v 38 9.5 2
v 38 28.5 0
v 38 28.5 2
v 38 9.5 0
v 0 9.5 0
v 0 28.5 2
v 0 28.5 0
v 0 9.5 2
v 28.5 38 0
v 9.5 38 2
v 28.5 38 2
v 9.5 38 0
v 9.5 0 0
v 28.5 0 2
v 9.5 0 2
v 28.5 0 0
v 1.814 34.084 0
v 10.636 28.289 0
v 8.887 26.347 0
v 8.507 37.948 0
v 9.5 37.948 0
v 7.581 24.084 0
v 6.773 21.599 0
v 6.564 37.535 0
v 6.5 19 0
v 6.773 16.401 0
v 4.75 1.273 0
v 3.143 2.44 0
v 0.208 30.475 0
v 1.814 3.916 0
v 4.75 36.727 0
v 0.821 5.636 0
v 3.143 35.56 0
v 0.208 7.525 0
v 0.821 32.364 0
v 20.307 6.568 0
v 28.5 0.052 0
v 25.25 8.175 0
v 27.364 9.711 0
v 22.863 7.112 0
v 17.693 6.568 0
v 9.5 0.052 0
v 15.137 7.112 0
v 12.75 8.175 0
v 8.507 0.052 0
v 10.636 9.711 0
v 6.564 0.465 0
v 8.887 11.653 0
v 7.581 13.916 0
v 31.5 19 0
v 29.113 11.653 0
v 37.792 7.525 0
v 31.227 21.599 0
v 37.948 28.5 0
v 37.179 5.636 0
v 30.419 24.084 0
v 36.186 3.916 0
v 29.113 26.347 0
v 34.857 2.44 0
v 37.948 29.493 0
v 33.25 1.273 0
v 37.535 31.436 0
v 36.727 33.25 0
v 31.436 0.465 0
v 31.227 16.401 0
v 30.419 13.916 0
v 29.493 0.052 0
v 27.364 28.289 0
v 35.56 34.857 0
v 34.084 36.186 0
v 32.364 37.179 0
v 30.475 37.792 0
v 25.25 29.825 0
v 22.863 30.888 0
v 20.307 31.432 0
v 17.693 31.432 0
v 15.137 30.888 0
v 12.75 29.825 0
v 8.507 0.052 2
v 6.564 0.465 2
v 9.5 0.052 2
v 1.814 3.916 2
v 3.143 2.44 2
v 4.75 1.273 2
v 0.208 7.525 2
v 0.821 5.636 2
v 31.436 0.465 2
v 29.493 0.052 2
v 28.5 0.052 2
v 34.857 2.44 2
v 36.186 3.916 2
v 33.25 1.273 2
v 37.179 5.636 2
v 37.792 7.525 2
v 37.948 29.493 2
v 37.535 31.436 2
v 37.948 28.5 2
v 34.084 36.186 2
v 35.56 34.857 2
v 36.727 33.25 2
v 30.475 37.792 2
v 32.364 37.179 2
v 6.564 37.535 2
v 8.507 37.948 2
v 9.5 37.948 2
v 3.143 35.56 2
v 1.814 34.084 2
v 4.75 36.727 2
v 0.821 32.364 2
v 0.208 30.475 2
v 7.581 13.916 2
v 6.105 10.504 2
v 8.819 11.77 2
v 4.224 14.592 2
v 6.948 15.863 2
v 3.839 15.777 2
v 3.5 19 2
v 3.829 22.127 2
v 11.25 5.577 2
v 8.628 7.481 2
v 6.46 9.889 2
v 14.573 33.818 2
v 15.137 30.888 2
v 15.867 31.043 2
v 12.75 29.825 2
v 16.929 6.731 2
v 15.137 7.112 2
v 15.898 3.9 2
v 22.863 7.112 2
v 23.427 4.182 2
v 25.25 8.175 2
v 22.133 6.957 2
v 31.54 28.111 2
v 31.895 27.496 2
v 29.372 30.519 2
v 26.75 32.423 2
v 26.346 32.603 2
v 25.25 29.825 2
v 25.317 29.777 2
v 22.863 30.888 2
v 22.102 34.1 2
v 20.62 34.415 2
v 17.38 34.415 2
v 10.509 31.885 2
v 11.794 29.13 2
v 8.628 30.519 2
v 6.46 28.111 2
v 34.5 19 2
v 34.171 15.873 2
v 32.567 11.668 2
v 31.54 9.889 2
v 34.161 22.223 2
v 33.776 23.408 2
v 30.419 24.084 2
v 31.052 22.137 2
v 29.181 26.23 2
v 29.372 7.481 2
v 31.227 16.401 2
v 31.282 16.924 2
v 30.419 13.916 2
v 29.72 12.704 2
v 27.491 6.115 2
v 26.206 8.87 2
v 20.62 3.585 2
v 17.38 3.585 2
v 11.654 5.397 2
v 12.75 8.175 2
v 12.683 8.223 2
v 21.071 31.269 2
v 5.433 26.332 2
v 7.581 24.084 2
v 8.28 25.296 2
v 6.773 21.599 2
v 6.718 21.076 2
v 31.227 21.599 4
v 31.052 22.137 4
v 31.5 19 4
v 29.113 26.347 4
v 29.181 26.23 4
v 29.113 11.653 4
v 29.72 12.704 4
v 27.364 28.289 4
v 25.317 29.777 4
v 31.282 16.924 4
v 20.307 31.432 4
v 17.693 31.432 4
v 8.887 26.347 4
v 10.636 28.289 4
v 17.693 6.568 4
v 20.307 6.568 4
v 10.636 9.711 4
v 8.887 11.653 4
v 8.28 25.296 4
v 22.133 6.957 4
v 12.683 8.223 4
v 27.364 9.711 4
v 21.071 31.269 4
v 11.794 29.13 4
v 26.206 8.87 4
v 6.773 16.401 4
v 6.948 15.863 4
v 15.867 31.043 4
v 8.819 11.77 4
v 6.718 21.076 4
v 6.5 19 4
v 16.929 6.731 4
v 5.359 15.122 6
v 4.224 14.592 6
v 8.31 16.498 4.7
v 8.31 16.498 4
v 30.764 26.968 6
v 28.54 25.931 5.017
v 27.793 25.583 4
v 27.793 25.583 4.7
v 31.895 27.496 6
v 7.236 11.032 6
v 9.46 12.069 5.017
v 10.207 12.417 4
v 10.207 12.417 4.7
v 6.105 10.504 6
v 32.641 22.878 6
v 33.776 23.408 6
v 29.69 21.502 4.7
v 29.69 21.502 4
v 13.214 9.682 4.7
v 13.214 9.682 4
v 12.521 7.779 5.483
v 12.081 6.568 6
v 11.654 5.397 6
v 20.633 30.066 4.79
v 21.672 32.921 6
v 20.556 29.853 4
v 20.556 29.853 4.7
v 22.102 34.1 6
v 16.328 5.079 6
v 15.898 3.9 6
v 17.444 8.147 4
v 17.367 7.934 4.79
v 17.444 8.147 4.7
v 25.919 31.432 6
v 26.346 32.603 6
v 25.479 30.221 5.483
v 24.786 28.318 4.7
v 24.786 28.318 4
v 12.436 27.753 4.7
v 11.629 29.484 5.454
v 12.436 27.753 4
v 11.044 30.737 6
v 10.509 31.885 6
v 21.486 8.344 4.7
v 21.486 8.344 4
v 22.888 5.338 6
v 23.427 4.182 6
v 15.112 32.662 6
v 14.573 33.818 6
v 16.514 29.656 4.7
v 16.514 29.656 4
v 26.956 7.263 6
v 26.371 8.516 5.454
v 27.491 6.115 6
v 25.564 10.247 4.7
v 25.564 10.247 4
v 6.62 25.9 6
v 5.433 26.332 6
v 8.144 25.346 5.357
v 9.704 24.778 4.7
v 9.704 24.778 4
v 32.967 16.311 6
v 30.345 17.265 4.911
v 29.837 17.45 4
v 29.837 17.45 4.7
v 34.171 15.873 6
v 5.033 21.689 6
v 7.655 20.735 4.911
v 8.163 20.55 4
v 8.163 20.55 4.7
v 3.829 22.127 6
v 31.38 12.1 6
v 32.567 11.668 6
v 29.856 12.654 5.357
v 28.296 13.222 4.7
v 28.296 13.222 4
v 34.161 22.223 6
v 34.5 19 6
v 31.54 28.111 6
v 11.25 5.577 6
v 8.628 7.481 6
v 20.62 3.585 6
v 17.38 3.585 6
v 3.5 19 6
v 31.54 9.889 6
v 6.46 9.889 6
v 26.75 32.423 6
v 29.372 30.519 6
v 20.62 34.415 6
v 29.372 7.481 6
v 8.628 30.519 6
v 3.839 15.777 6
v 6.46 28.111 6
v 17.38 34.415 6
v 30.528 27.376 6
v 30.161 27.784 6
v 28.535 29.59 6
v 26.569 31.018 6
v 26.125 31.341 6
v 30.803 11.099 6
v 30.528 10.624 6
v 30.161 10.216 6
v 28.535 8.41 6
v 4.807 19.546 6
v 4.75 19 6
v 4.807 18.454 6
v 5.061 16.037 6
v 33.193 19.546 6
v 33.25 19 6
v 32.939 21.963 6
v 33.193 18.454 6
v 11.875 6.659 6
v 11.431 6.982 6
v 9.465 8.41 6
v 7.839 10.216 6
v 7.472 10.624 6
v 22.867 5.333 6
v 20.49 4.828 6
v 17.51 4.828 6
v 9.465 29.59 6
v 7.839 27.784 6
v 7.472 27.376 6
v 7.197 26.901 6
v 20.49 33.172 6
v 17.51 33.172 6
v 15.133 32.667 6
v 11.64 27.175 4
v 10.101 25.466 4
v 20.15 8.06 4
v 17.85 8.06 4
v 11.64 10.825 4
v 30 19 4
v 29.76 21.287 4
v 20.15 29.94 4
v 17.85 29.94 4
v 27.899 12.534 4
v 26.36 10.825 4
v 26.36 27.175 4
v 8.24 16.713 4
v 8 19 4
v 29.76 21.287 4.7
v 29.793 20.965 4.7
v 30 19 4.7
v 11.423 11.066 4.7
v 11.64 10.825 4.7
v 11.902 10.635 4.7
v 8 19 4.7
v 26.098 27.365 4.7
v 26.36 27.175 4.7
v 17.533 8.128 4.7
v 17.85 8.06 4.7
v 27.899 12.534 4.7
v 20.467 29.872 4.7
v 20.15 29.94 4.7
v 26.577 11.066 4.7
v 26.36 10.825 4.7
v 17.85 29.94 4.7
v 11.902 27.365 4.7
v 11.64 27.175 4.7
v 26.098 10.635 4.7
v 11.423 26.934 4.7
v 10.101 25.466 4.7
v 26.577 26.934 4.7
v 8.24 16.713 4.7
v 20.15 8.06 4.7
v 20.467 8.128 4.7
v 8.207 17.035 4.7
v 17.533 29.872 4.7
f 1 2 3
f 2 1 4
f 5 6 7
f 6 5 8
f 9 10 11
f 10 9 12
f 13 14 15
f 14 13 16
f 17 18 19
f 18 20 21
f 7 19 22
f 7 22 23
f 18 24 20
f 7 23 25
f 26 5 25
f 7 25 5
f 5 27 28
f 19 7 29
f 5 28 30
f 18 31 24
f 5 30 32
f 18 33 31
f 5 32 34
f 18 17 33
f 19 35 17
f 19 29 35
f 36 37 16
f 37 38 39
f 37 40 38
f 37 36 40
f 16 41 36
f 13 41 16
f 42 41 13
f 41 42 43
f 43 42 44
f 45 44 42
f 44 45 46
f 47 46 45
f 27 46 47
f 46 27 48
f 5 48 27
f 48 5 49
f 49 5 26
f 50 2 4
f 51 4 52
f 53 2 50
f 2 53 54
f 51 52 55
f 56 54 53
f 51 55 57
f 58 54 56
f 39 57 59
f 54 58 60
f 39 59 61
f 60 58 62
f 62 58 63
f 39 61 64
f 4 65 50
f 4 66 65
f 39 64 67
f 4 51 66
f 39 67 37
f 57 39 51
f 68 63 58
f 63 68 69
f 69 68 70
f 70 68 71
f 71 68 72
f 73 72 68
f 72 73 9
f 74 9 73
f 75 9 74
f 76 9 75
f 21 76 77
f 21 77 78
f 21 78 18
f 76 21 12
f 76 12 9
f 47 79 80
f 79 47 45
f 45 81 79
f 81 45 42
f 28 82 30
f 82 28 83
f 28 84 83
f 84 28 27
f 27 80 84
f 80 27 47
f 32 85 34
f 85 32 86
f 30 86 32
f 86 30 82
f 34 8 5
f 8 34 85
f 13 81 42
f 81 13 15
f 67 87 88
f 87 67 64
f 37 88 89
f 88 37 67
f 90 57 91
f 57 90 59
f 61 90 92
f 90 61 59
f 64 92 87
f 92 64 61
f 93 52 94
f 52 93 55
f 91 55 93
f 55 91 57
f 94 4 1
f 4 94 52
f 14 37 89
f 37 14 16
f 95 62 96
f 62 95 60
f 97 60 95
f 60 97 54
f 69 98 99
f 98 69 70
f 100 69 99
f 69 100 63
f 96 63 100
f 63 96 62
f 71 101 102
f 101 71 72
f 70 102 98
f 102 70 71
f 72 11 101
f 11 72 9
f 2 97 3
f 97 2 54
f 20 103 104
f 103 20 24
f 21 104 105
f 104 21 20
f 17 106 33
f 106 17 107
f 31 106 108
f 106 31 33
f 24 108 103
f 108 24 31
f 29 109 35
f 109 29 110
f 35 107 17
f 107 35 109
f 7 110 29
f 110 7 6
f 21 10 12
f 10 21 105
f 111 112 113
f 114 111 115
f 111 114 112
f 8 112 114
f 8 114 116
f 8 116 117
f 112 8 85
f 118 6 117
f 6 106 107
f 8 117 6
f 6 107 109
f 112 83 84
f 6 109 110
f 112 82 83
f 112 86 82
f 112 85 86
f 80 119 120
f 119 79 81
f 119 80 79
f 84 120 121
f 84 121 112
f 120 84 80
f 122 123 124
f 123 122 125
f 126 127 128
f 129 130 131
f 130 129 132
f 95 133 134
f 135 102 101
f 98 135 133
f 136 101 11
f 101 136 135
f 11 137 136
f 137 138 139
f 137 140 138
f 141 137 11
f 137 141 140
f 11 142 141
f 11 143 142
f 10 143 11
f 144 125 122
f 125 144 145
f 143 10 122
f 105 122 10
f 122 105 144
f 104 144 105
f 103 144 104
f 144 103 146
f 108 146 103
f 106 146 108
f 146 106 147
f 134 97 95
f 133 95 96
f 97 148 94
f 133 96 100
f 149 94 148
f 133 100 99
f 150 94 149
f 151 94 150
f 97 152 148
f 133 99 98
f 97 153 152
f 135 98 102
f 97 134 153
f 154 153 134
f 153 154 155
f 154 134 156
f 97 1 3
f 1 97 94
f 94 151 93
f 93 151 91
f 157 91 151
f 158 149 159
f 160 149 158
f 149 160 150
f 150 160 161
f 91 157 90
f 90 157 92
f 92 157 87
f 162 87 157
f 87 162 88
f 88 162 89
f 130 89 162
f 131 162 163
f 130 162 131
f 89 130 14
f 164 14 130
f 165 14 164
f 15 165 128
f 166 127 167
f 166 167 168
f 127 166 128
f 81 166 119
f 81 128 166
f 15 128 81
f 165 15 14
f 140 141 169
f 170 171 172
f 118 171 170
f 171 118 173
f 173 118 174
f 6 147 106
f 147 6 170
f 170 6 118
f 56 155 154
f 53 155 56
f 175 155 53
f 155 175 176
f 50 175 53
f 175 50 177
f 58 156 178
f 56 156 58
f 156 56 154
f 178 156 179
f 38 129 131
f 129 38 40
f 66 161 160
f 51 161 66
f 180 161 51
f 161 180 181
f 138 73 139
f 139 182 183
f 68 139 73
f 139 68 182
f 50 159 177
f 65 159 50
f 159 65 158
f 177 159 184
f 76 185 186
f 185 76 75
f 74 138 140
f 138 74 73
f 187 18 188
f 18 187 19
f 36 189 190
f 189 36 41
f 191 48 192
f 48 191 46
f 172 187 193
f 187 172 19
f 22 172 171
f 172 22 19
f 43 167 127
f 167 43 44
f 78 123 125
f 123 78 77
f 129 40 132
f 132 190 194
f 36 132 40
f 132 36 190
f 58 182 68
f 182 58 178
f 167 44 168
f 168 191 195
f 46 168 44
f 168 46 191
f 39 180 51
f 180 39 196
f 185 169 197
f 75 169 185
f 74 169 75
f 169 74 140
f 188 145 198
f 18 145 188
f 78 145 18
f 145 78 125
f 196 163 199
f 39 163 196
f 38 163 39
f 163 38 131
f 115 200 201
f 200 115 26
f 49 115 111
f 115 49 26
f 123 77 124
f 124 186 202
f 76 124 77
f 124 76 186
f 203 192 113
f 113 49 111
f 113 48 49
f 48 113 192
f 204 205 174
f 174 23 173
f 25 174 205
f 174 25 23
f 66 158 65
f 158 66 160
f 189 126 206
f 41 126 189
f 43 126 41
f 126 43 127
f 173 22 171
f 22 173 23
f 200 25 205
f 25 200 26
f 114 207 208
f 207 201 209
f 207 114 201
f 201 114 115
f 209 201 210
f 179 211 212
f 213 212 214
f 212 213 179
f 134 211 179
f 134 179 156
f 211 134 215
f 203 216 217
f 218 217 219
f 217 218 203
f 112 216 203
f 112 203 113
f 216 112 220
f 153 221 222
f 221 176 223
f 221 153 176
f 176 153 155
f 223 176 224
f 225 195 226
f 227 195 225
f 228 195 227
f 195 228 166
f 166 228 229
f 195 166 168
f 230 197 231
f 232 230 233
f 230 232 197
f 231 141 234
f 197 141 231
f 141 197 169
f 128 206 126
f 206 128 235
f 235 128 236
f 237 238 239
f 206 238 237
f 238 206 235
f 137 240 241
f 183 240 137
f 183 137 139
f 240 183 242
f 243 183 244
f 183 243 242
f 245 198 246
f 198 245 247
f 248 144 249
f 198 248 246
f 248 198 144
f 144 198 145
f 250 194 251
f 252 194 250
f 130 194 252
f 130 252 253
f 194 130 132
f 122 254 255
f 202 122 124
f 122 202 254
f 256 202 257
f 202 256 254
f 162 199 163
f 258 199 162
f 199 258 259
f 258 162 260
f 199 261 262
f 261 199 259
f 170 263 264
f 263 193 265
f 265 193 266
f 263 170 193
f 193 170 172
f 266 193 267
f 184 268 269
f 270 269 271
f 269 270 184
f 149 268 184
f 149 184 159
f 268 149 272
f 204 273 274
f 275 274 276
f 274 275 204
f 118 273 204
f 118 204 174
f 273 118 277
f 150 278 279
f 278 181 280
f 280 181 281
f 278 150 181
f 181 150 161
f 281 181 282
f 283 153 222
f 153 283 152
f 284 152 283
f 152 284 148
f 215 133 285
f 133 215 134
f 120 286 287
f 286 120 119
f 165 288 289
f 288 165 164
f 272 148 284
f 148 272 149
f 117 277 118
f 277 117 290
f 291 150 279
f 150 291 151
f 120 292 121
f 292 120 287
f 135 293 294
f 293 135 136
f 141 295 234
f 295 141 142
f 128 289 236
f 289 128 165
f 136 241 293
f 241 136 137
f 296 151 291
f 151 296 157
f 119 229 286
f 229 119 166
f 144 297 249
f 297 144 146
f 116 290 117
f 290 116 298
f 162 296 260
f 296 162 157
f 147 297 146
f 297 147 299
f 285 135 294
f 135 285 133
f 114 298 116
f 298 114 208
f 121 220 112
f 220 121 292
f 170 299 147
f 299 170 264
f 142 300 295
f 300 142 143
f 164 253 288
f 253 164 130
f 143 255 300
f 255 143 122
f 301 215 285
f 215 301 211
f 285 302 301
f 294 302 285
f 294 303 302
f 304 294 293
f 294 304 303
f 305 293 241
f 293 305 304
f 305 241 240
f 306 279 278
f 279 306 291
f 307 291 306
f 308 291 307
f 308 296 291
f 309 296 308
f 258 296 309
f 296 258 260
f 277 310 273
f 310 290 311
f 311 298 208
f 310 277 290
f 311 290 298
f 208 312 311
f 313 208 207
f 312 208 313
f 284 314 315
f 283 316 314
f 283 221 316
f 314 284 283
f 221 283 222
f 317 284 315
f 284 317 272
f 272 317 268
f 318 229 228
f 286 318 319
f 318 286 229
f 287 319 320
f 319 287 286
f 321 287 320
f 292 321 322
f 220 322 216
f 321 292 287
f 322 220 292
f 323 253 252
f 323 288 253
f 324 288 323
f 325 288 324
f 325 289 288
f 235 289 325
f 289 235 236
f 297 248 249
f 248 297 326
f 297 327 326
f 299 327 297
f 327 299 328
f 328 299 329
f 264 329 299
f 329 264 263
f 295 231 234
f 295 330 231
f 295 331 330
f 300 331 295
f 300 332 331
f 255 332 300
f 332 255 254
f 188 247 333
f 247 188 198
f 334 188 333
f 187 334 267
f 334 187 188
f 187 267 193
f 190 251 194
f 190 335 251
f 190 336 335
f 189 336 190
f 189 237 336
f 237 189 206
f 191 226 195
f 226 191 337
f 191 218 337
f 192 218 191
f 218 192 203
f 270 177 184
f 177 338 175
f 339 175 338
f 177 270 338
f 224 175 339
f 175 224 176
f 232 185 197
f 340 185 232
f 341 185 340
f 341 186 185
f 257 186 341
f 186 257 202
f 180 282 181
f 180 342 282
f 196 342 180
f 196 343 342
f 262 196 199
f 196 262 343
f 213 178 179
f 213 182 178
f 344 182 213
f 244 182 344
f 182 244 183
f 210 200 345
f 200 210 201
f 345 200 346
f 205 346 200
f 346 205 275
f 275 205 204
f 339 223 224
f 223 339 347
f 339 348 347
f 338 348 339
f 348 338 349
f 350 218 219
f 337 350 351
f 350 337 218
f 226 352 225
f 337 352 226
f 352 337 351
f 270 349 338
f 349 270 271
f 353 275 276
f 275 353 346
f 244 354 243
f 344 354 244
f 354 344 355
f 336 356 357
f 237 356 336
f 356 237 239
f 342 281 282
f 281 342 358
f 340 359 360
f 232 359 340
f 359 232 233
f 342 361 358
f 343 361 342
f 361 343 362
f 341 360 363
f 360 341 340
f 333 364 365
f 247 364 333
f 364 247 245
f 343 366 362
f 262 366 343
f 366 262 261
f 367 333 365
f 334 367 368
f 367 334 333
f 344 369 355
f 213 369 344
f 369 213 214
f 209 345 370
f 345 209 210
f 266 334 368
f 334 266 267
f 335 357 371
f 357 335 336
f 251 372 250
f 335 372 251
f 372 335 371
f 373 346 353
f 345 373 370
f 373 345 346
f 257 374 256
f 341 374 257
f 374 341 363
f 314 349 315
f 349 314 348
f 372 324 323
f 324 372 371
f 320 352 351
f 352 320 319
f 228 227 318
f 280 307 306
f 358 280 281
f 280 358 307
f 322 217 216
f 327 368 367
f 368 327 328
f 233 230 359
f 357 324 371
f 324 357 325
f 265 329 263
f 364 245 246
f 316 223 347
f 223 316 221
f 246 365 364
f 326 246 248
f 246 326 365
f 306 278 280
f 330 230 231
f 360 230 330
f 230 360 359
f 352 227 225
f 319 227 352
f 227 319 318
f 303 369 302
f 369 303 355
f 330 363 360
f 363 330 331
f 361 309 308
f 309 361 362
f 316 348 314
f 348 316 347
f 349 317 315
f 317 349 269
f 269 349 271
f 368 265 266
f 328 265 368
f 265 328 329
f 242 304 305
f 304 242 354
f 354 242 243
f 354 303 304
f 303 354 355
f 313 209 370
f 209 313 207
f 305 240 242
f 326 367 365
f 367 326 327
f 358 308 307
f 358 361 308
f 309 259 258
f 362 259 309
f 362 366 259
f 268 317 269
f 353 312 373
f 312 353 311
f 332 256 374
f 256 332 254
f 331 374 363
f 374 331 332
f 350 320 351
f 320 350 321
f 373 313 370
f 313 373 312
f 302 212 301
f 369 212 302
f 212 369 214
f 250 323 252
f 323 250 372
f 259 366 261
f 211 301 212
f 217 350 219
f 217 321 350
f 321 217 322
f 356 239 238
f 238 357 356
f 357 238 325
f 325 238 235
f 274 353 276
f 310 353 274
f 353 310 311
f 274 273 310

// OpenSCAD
// Units: mm

dimension = 38;         // overall width and length of base
height = 2;             // thickness of base
center_diameter = 25;   // Diameter of hole

tab_height = 4;         // Overall height of tabs

tab_top_thickness = 3;  // Overall depth of teeth
tab_thickness = 2;      // Depth of wedge on teeth
tab_wedge_height = 2;   // Height of wedge

tabs = 8;               // How many tabs (must be even number)
tab_space = 4.5;        // Space between each tab
tab_start_angle = 25;   // Determines where the tabs end up.

union() {
    // The base with a circle cut through it
    difference() {
        cube([dimension,dimension,height]);
        translate([dimension/2,dimension/2,-1])
            cylinder(height+2,center_diameter/2,center_diameter/2); 
        
        rounded();
        
    }

    // The teeth
    difference() {
        translate([dimension/2,dimension/2,height])
            cylinder(tab_height, (center_diameter+(tab_top_thickness*2))/2, (center_diameter+(tab_top_thickness*2))/2);
        translate([dimension/2,dimension/2,0])
            cylinder(height+tab_height-tab_wedge_height,center_diameter/2,center_diameter/2); 
        translate([dimension/2,dimension/2,0])
            cylinder(height+tab_height+2,(center_diameter-tab_top_thickness)/2,(center_diameter-tab_top_thickness)/2);
        for (angle =[tab_start_angle:180/(tabs/2):180]) {
            translate([dimension/2,dimension/2,height]) rotate(angle)
                cube([center_diameter+(tab_top_thickness*2),tab_space,(tab_height*2)+(height*2)], true);
        }
    translate([dimension/2,dimension/2,height+tab_height-tab_wedge_height+0.5])
        cylinder(tab_wedge_height,(center_diameter/2)-((tab_top_thickness-tab_thickness)*2),(center_diameter/2) + tab_top_thickness);
    }
}

// Give our base rounded corners
module rounded() {
    translate([0,0,0]) difference() {
        translate([0,0,-1])
            cube([dimension,dimension,height+2]);
                translate([(dimension/4), (dimension/4)])
                    cylinder(height+3, dimension/4, dimension/4);
                translate([(dimension/4), -1])
                    cube([dimension*2,dimension*2,height+3]);
                translate([-1, (dimension/4)])
                    cube([dimension*2,dimension*2,height+3]);
    }
    
    translate([dimension,0,0]) mirror([1,0,0]) difference() {
        translate([0,0,-1])
            cube([dimension,dimension,height+2]);
                translate([(dimension/4), (dimension/4)])
                    cylinder(height+3, dimension/4, dimension/4);
                translate([(dimension/4), -1])
                    cube([dimension*2,dimension*2,height+3]);
                translate([-1, (dimension/4)])
                    cube([dimension*2,dimension*2,height+3]);
    }
    
    translate([dimension,dimension,0]) mirror([1,1,0]) difference() {
        translate([0,0,-1])
            cube([dimension,dimension,height+2]);
                translate([(dimension/4), (dimension/4)])
                    cylinder(height+3, dimension/4, dimension/4);
                translate([(dimension/4), -1])
                    cube([dimension*2,dimension*2,height+3]);
                translate([-1, (dimension/4)])
                    cube([dimension*2,dimension*2,height+3]);
    }
    
    translate([0,dimension,0]) mirror([0,1,0]) difference() {
        translate([0,0,-1])
            cube([dimension,dimension,height+2]);
                translate([(dimension/4), (dimension/4)])
                    cylinder(height+3, dimension/4, dimension/4);
                translate([(dimension/4), -1])
                    cube([dimension*2,dimension*2,height+3]);
                translate([-1, (dimension/4)])
                    cube([dimension*2,dimension*2,height+3]);
    }
    
}    
